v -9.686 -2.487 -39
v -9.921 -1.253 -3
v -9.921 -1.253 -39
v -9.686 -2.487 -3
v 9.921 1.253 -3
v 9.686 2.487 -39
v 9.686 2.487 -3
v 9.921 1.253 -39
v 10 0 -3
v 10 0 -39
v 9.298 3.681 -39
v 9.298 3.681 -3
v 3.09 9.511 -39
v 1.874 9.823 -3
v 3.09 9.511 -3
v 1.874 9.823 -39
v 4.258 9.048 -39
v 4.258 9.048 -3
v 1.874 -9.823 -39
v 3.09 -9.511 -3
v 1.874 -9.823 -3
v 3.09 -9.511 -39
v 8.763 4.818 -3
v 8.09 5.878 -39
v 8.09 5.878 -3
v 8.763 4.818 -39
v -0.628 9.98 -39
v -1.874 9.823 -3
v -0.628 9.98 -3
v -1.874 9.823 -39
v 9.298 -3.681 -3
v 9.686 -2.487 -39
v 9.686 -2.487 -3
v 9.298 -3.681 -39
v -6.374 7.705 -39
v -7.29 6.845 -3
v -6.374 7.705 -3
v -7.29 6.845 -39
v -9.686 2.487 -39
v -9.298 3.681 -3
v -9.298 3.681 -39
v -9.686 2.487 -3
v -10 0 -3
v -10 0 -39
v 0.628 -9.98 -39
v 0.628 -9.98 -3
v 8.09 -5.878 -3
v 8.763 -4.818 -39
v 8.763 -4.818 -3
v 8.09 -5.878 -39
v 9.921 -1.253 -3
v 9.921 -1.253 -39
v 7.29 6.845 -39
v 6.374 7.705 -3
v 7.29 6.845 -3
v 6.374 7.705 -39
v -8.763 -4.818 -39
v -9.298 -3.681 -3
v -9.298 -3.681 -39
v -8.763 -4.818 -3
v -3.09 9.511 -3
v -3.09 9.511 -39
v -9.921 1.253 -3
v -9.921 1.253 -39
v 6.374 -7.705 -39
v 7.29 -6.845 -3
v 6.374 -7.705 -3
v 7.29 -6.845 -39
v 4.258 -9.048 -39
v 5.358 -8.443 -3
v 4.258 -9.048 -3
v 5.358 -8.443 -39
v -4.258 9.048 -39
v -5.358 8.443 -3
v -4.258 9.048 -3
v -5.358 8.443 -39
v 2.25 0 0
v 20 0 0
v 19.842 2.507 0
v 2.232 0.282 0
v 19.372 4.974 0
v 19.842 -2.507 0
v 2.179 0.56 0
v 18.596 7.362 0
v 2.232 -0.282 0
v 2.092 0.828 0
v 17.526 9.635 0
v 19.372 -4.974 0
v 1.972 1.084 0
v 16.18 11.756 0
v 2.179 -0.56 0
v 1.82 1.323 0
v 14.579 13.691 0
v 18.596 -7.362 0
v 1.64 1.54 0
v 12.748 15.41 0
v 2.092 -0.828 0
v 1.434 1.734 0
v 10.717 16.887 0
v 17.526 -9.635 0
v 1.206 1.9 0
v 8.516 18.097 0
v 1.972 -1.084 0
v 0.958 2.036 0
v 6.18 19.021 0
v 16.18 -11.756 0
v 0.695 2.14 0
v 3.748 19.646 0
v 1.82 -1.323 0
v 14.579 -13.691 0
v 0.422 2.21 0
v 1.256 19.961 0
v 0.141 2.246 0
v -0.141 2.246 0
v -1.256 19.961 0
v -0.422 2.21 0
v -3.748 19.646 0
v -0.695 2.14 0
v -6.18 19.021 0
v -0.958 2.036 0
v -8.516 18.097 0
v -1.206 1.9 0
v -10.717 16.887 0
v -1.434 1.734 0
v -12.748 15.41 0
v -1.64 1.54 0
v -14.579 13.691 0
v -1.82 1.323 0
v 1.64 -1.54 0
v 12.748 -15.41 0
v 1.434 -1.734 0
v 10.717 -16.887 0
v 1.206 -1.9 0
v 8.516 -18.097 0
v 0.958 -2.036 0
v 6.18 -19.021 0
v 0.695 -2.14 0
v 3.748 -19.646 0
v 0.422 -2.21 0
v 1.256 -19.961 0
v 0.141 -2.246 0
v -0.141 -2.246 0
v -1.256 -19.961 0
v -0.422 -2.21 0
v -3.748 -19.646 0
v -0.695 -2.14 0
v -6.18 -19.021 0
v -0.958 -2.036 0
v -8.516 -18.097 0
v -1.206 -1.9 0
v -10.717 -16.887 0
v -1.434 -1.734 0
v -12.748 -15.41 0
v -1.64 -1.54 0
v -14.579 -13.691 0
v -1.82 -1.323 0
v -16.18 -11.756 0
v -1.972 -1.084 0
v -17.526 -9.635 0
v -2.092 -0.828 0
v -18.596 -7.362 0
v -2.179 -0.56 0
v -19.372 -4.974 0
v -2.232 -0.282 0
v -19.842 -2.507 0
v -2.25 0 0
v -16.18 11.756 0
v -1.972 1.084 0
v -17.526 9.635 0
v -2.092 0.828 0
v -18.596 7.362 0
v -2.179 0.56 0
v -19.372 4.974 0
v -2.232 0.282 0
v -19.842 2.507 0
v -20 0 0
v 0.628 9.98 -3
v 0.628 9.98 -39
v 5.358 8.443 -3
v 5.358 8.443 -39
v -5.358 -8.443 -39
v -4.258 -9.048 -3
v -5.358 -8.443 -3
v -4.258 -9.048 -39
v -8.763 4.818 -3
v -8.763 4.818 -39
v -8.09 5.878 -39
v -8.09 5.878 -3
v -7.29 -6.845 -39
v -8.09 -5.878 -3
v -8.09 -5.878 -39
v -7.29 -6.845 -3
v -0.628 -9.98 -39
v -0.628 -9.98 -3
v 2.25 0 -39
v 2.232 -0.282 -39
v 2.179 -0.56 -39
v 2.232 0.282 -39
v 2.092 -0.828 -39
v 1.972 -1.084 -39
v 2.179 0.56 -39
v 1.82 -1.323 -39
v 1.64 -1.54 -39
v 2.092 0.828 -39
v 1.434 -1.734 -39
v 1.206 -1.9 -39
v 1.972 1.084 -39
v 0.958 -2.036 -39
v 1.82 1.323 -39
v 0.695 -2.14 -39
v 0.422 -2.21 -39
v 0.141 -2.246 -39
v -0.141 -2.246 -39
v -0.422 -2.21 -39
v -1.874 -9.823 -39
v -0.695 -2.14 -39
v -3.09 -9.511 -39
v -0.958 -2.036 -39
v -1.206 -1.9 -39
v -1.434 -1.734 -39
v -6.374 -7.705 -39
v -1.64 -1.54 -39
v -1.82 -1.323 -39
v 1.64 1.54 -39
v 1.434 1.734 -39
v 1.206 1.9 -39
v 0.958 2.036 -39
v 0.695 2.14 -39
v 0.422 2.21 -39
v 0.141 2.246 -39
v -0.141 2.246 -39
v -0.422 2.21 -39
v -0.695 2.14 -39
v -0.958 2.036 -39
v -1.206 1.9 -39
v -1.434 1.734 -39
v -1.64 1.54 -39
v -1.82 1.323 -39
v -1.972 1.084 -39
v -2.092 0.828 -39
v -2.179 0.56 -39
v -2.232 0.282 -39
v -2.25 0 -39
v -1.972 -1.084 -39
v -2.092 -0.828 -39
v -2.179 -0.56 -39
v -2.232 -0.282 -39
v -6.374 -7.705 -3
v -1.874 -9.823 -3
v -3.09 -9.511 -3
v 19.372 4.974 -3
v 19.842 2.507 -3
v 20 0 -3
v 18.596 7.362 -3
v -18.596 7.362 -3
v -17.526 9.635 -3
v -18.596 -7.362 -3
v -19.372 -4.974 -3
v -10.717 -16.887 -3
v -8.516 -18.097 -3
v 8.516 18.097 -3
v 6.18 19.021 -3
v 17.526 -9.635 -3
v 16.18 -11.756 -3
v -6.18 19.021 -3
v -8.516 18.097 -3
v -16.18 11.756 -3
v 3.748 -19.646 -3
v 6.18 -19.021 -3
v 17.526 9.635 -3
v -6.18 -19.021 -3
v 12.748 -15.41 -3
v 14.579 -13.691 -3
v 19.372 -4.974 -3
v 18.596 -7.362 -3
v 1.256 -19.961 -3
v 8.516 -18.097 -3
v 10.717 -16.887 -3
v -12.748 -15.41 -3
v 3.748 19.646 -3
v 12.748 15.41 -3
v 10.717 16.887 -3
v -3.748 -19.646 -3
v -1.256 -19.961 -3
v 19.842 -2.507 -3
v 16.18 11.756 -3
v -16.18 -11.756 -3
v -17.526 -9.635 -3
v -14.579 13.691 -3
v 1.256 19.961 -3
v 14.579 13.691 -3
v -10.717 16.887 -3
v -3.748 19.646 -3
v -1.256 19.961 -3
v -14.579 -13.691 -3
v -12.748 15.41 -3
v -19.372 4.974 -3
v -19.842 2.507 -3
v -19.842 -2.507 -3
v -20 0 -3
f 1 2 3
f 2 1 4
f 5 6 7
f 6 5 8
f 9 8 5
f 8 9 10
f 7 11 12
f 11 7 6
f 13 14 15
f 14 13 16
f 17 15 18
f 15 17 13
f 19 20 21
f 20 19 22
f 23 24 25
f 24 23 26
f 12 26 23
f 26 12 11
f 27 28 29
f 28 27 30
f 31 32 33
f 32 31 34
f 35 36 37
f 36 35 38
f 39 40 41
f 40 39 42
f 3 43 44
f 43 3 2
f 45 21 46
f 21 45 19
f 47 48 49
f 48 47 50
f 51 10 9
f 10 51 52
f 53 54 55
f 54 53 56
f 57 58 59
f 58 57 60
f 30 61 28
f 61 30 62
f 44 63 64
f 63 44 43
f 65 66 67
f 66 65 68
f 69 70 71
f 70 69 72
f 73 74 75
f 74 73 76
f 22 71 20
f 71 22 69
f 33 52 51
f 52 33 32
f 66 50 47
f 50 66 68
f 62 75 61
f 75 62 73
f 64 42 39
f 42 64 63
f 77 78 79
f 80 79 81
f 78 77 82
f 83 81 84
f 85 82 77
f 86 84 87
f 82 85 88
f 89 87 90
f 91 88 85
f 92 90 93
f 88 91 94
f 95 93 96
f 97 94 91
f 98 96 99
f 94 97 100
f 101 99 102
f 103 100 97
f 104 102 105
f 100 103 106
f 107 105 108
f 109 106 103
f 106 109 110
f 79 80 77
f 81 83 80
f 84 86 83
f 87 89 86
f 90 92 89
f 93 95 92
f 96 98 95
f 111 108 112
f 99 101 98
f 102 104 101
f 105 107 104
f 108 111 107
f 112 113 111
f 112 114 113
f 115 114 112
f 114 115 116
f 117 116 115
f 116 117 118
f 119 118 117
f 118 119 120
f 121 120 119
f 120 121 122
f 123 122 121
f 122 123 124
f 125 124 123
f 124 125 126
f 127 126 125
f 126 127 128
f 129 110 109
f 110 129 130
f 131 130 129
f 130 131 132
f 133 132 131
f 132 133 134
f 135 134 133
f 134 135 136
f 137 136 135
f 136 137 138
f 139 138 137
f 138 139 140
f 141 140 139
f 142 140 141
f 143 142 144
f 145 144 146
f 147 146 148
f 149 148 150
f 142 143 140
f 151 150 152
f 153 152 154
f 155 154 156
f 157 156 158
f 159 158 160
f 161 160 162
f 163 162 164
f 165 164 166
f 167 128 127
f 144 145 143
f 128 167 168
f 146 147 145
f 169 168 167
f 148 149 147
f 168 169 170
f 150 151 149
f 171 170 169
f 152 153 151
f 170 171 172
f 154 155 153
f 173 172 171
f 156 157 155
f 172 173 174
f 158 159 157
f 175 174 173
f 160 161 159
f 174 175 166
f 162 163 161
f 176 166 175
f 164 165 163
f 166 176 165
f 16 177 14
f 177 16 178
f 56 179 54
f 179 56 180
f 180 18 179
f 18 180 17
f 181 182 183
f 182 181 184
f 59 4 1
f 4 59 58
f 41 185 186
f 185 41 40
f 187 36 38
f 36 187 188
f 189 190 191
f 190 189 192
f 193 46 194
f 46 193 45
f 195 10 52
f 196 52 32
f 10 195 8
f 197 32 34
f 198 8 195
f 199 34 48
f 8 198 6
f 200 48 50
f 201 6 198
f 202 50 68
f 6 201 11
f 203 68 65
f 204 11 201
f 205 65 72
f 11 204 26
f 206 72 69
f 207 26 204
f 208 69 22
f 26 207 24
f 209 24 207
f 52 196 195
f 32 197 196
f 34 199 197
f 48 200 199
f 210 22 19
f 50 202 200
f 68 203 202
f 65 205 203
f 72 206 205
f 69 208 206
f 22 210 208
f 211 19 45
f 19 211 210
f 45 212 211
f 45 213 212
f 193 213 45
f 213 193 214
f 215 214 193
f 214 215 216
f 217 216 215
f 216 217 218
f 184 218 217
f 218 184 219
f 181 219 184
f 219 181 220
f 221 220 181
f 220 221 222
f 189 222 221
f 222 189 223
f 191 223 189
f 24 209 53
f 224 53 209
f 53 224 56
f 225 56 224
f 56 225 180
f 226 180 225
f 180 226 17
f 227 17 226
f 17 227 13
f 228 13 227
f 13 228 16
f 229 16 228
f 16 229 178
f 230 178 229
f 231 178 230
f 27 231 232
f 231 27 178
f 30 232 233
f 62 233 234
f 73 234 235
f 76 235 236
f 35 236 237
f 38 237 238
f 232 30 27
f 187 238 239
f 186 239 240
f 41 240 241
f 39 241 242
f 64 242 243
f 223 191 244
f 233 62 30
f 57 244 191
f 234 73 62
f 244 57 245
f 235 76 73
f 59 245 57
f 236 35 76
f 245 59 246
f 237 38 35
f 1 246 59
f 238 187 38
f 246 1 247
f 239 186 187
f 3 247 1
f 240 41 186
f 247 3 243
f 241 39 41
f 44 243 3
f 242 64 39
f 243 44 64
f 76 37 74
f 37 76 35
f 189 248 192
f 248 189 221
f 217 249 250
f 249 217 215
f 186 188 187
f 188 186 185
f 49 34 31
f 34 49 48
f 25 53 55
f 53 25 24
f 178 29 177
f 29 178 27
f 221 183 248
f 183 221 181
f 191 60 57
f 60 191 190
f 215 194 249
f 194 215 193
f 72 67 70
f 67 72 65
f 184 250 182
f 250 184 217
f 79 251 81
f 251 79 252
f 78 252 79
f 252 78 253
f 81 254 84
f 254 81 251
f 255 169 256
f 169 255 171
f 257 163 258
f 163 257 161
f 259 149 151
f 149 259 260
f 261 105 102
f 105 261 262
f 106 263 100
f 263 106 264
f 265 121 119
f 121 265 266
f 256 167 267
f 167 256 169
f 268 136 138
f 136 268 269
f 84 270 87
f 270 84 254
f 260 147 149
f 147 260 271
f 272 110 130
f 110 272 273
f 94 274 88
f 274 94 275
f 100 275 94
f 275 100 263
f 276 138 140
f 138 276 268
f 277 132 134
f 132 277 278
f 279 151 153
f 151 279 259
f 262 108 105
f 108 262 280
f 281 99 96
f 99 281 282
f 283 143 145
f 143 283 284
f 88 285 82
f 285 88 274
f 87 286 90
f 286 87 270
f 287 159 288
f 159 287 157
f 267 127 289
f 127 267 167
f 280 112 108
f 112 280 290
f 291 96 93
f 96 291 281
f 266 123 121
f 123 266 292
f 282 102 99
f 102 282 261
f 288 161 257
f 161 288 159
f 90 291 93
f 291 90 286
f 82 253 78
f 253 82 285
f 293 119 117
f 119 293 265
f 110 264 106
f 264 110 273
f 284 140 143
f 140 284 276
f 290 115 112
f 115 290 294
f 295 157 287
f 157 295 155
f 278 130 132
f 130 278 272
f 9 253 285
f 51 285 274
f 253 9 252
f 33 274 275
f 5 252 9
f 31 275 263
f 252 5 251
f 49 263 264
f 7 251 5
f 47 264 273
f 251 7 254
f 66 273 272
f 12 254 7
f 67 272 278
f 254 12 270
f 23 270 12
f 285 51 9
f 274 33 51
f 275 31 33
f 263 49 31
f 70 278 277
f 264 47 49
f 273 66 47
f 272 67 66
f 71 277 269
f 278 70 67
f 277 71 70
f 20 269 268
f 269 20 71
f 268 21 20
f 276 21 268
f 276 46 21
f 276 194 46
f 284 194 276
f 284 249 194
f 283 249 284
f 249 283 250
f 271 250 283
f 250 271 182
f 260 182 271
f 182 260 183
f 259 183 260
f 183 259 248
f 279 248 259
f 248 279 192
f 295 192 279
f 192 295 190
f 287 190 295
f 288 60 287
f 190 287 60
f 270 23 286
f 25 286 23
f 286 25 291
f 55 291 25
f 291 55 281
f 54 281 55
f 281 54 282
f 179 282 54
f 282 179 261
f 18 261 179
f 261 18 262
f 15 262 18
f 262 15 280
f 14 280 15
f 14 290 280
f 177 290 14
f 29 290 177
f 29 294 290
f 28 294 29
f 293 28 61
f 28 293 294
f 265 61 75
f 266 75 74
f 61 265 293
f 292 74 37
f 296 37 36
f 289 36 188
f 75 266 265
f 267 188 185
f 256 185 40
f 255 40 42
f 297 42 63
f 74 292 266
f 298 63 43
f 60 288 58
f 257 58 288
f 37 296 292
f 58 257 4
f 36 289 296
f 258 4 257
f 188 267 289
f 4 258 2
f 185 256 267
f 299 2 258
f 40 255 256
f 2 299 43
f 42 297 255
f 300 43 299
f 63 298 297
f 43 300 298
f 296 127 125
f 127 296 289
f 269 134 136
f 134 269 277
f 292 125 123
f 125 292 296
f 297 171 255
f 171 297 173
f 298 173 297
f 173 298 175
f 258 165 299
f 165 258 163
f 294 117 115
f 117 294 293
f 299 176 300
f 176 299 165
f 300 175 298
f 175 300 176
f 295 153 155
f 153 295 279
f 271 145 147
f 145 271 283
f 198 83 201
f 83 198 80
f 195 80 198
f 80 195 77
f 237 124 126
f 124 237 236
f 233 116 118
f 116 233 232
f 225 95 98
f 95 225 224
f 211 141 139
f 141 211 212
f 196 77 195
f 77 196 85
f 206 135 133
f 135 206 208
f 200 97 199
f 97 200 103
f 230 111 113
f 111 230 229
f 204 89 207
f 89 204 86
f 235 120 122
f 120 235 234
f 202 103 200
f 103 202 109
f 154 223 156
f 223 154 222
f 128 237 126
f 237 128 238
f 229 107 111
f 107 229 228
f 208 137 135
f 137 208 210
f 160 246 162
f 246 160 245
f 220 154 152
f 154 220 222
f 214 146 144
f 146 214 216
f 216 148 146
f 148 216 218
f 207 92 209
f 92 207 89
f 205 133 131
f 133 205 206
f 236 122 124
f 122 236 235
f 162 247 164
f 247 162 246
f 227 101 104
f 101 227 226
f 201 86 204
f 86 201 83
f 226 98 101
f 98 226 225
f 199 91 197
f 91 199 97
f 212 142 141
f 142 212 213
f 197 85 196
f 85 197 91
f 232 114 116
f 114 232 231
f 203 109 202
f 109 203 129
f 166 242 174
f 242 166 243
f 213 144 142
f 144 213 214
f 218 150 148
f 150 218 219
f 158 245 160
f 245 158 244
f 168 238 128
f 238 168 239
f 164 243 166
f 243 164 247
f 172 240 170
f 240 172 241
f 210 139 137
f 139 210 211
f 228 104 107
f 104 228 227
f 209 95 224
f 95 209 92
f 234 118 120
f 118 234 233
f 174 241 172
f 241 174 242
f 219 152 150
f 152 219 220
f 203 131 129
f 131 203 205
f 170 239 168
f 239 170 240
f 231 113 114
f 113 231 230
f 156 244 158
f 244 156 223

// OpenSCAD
$fn = 50;


difference() {
	union() {
		translate(v = [0, 0, -39.0000000000]) {
			cylinder(h = 39, r = 10.0000000000);
		}
		translate(v = [0, 0, -3.0000000000]) {
			cylinder(h = 3, r = 20.0000000000);
		}
	}
	union() {
		#translate(v = [0, 0, -39]) {
			cylinder(h = 39, r = 2.2500000000);
		}
	}
}
